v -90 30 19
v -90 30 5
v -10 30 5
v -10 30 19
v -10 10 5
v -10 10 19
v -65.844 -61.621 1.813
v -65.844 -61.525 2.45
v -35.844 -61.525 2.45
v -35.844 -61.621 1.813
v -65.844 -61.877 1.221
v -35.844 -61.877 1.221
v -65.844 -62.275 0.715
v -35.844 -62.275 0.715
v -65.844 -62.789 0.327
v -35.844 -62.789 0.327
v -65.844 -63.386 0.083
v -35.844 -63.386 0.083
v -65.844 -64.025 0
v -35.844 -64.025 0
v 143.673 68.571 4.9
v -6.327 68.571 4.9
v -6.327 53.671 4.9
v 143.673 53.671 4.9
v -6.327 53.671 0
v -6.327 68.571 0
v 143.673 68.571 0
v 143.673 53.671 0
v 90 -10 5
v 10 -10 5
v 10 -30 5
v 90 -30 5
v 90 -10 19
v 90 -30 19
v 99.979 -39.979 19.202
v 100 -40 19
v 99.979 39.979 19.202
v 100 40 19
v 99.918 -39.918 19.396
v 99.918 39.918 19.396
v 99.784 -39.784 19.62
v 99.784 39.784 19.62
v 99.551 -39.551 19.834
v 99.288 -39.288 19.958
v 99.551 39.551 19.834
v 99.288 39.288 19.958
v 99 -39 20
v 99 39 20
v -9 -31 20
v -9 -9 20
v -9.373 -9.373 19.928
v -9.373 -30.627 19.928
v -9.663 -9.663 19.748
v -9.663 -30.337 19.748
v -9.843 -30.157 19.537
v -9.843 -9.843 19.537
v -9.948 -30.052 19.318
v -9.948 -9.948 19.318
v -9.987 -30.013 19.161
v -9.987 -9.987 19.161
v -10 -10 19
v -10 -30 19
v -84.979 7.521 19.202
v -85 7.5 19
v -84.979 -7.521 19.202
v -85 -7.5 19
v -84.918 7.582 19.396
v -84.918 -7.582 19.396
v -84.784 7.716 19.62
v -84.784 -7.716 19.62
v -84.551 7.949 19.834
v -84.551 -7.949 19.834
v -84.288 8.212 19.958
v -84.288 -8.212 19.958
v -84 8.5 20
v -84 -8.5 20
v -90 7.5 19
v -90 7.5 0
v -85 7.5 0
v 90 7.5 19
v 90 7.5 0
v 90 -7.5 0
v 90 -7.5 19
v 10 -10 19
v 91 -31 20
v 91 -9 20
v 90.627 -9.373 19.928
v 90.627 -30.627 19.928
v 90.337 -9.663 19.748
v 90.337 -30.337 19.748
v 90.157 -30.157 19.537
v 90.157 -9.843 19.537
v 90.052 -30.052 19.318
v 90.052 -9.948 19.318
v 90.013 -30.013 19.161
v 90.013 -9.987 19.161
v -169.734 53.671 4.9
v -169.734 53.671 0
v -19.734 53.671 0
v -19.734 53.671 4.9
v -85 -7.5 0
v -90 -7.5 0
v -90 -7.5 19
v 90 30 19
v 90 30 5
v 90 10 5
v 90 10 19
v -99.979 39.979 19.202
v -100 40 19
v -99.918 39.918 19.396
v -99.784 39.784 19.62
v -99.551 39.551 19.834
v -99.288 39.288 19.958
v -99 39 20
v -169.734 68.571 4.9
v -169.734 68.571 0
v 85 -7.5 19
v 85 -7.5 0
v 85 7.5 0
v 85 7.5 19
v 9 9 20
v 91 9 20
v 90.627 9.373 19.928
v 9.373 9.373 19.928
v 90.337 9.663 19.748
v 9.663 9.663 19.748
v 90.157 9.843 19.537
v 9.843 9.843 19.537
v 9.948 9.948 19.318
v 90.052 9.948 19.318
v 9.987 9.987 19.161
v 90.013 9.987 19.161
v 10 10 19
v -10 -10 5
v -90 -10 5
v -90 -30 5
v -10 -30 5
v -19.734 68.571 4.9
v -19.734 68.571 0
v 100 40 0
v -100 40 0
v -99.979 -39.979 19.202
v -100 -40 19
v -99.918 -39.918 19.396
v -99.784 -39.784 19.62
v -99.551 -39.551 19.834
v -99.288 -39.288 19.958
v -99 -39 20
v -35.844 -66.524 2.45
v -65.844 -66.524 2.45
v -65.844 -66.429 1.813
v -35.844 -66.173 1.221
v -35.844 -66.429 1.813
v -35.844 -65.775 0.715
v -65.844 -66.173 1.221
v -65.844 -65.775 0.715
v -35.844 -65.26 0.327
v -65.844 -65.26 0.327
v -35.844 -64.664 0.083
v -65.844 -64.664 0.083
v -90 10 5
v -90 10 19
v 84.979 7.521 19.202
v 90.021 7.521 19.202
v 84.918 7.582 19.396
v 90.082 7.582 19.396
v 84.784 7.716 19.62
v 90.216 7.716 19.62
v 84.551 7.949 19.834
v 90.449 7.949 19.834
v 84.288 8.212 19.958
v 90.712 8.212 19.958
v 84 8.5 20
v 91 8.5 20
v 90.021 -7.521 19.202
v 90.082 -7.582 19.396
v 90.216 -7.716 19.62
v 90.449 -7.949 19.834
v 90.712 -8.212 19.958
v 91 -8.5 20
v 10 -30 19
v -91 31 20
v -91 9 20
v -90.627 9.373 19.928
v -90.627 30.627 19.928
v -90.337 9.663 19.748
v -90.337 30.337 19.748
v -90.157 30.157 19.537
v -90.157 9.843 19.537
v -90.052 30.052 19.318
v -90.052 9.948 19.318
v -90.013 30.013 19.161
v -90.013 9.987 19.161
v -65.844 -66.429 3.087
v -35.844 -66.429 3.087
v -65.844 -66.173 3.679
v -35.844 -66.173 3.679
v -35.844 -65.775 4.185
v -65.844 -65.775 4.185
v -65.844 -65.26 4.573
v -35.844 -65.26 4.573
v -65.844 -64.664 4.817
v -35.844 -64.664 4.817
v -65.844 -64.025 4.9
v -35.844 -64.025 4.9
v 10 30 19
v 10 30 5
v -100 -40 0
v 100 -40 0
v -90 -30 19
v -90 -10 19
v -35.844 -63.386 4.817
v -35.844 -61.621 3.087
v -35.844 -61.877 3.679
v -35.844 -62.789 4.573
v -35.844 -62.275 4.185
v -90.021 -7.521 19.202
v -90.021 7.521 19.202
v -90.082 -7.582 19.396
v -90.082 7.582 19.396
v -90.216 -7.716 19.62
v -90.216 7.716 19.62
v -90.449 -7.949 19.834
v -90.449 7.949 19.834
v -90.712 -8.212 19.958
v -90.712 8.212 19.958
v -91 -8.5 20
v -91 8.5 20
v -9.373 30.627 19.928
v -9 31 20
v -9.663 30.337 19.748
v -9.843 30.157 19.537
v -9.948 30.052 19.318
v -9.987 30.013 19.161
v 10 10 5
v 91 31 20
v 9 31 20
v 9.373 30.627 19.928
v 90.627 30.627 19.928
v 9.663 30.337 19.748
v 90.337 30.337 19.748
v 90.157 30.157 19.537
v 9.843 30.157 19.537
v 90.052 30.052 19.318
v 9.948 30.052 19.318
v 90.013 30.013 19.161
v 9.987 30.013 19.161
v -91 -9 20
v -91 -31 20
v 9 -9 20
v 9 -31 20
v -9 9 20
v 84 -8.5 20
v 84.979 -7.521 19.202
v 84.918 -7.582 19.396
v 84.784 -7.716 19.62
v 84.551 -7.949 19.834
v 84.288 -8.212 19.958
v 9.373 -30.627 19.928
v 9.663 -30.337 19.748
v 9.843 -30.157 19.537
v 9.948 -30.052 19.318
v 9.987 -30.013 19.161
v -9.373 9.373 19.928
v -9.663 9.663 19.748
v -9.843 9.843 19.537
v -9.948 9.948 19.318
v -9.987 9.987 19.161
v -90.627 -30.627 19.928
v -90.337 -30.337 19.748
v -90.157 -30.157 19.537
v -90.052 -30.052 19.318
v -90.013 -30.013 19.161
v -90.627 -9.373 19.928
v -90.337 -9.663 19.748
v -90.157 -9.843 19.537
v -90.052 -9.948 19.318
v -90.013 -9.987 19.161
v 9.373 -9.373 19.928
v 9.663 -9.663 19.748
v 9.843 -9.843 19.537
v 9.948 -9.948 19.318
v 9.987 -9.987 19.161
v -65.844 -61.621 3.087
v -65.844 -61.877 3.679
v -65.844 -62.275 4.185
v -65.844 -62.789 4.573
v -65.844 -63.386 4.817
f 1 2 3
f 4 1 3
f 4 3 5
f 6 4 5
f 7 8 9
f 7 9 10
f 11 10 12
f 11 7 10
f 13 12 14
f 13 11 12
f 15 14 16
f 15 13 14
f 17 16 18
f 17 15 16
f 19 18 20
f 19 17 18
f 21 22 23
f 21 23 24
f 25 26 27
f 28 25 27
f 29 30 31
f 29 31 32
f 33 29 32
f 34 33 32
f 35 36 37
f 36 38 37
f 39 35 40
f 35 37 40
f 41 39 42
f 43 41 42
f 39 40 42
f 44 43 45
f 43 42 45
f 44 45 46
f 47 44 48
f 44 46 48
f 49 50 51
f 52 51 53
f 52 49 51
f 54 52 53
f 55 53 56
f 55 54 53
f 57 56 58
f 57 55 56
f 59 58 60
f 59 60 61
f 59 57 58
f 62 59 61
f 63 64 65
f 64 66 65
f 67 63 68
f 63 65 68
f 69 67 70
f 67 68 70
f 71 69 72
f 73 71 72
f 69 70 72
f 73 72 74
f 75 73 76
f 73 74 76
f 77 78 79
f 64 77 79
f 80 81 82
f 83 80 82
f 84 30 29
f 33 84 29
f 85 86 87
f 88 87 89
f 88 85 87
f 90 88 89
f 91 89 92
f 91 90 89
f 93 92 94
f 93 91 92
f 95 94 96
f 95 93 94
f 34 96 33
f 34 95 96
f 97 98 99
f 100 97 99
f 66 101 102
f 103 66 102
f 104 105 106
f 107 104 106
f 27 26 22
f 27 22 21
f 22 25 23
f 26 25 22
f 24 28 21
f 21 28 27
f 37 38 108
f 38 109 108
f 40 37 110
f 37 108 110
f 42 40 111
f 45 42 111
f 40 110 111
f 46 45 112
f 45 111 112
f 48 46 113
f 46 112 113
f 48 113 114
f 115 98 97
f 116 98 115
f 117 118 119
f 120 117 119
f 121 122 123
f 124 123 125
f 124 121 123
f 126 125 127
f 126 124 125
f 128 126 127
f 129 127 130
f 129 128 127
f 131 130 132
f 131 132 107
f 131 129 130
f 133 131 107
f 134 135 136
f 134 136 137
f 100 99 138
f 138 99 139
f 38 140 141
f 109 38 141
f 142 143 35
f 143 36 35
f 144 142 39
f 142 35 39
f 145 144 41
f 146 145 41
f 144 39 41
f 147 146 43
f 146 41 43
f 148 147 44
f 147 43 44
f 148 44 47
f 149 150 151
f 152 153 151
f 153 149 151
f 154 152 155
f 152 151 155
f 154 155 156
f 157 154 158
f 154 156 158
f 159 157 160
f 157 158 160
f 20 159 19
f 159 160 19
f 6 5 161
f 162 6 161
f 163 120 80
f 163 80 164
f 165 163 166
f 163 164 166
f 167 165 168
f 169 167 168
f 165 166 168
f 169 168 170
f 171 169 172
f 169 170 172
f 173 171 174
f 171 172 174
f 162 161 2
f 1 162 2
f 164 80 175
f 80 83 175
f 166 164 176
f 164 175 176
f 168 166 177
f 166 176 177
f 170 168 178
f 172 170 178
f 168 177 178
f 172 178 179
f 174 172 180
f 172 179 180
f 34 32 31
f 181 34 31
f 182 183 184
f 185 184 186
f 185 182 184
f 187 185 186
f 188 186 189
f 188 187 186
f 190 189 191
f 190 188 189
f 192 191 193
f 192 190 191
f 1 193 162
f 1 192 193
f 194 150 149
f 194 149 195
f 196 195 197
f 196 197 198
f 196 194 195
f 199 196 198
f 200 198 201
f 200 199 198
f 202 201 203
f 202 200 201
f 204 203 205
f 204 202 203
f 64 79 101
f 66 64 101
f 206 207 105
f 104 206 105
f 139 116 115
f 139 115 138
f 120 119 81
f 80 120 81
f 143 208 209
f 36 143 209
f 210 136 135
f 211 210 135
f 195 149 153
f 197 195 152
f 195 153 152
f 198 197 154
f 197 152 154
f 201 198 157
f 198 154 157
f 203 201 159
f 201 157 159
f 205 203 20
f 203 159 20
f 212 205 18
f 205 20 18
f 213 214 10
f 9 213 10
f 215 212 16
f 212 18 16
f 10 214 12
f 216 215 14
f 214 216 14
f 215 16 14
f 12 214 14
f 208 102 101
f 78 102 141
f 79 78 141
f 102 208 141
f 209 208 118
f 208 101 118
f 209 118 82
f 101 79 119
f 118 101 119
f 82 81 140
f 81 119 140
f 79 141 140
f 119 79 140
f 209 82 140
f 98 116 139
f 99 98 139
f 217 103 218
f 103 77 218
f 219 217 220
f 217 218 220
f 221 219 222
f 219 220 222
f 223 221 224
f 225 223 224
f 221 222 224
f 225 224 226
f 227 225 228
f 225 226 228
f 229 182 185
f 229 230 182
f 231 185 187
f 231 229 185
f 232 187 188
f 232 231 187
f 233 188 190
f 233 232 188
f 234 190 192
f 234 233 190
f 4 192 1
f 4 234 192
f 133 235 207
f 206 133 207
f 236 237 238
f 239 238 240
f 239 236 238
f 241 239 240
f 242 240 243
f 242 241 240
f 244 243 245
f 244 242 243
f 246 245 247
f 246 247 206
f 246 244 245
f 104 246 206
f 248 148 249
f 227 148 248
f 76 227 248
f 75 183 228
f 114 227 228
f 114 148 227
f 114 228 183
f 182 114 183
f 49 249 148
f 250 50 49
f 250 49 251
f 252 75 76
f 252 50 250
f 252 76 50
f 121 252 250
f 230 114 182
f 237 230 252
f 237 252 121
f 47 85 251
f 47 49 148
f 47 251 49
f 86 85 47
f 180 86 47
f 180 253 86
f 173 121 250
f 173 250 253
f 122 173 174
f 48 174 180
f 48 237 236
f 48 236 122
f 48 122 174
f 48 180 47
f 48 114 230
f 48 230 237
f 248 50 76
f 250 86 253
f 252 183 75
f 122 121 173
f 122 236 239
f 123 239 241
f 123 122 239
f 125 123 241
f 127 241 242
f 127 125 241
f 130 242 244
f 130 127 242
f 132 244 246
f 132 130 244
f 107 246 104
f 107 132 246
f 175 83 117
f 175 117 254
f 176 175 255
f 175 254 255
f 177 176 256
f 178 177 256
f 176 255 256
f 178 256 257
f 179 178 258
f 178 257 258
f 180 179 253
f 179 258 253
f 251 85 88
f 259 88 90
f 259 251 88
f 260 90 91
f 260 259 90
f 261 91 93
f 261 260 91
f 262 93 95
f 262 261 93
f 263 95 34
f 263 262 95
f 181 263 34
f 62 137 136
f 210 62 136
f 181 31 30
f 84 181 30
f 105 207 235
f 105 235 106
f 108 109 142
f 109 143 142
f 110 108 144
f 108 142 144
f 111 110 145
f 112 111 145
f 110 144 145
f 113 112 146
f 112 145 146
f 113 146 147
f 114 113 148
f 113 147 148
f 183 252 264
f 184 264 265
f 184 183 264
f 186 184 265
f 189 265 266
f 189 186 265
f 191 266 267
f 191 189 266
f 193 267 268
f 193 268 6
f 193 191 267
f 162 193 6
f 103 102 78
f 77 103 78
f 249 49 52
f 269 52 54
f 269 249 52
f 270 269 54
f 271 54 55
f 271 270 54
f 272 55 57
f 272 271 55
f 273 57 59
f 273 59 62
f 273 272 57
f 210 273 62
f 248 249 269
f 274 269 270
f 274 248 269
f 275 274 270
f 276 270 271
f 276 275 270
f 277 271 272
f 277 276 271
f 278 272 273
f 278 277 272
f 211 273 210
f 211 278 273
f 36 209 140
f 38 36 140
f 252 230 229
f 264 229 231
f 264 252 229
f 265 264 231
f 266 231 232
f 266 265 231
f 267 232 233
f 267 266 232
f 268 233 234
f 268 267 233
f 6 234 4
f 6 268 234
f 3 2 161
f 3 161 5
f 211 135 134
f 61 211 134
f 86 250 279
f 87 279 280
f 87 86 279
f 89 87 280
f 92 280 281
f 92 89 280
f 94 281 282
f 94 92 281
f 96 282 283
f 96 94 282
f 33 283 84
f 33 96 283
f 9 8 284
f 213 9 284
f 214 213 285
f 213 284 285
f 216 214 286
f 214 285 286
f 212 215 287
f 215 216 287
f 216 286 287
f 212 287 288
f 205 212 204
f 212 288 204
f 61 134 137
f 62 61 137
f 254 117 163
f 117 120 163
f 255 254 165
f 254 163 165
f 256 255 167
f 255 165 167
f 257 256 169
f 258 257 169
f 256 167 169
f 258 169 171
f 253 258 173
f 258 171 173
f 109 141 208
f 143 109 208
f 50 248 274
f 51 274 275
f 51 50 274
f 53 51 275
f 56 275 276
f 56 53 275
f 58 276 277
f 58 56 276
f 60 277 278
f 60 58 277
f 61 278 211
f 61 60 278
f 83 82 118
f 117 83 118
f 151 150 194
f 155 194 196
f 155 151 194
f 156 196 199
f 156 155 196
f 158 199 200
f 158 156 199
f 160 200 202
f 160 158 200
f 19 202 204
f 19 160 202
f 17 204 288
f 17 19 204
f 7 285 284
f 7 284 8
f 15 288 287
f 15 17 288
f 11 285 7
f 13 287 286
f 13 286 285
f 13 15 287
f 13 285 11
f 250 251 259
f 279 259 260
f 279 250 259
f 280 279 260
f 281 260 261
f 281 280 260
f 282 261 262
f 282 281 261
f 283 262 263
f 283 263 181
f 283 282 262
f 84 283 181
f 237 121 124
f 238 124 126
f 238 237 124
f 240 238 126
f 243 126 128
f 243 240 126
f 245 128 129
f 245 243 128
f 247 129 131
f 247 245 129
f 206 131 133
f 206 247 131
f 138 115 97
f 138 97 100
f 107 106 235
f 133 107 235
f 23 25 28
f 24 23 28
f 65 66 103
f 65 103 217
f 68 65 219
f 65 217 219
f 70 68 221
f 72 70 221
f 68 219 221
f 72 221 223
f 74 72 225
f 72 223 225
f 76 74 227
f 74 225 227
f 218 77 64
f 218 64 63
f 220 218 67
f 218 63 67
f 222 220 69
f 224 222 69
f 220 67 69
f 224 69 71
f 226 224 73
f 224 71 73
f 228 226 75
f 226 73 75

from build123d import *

# Parameters (mm, degrees)
F0_W        = 10
F0_H        = 10
F1_DEPTH    = 20
F0_W_2      = 80
F0_H_2      = 20
F2_DEPTH    = 5
F3_DEPTH    = 5
F4_DEPTH    = 5
F5_DEPTH    = 5
F6_W        = 150
F6_H        = 14.9
F7_DEPTH    = 4.9
F6_W_2      = 30
F6_H_2      = 5
F8_R        = 1
F9_T1_DEPTH = 42.5


# Not quite as in the source:
# - a fillet or chamfer that OpenCascade refuses, or shapes differently, is made with other operations: its cross-section is extruded or revolved along the edge and cut away or added


with BuildPart() as f1:
    # F0 (on Top) → F1 (new body)
    with BuildSketch(Plane.XY):
        Polygon((10, 10), (10, 30), (-10, 30), (-10, 10), (-90, 10), (-90, 7.5), (-85, 7.5), (-85, -7.5), (-90, -7.5), (-90, -10), (-10, -10), (-10, -30), (10, -30), (10, -10), (90, -10), (90, -7.5), (85, -7.5), (85, 7.5), (90, 7.5), (90, 10), align=None)
        Polygon((-90, 10), (-90, 30), (-100, 30), (-100, -30), (-90, -30), (-90, -10), (-90, -7.5), (-90, 7.5), align=None)
        with Locations((-95, -35)):
            Rectangle(F0_W, F0_H)
        Polygon((90, -40), (90, -30), (10, -30), (-10, -30), (-90, -30), (-90, -40), align=None)
        with Locations((-95, 35)):
            Rectangle(F0_W, F0_H)
        Polygon((90, 30), (90, 40), (-90, 40), (-90, 30), (-10, 30), (10, 30), align=None)
        with Locations((95, 35)):
            Rectangle(F0_W, F0_H)
        Polygon((100, -30), (100, 30), (90, 30), (90, 10), (90, 7.5), (90, -7.5), (90, -10), (90, -30), align=None)
        with Locations((95, -35)):
            Rectangle(F0_W, F0_H)
    extrude(amount=F1_DEPTH)

    # F0 (on Top) → F2 (join)
    with BuildSketch(Plane.XY):
        with Locations((-50, 20)):
            Rectangle(F0_W_2, F0_H_2)
    extrude(amount=F2_DEPTH)

    # F0 (on Top) → F3 (join)
    with BuildSketch(Plane.XY):
        with Locations((-50, -20)):
            Rectangle(F0_W_2, F0_H_2)
    extrude(amount=F3_DEPTH)

    # F0 (on Top) → F4 (join)
    with BuildSketch(Plane.XY):
        with Locations((50, 20)):
            Rectangle(F0_W_2, F0_H_2)
    extrude(amount=F4_DEPTH)

    # F0 (on Top) → F5 (join)
    with BuildSketch(Plane.XY):
        with Locations((50, -20)):
            Rectangle(F0_W_2, F0_H_2)
    extrude(amount=F5_DEPTH)

    # F8
    f8_edges = [f1.edges().sort_by_distance(p)[0] for p in [
        (-90, 0, 20),
        (-85, 0, 20),
        (-87.5, 7.5, 20),
        (-87.5, -7.5, 20),
        (85, 0, 20),
        (87.5, 7.5, 20),
        (90, 0, 20),
        (87.5, -7.5, 20),
        (-50, -10, 20),
        (-90, -20, 20),
        (-50, -30, 20),
        (50, -30, 20),
        (-10, -20, 20),
        (50, -10, 20),
        (10, -20, 20),
        (90, -20, 20),
        (0, -40, 20),
        (100, 0, 20),
        (0, 40, 20),
        (-100, 0, 20),
        (-10, 20, 20),
        (-50, 10, 20),
        (-90, 20, 20),
        (-50, 30, 20),
        (10, 20, 20),
        (50, 30, 20),
        (90, 20, 20),
        (50, 10, 20),
    ]]
    fillet(f8_edges, radius=F8_R)


with BuildPart() as f7:
    # F6 (on Top) → F7 (new body)
    with BuildSketch(Plane.XY):
        with Locations((-94.7340503335, 61.1213589191)):
            Rectangle(F6_W, F6_H)
    extrude(amount=F7_DEPTH)


with BuildPart() as f7b:
    # F6 (on Top) → F7, piece 2 (new body)
    with BuildSketch(Plane.XY):
        with Locations((68.6728258617, 61.1213589191)):
            Rectangle(F6_W, F6_H)
    extrude(amount=F7_DEPTH)


with BuildPart() as f7c:
    # F6 (on Top) → F7, piece 3 (new body)
    with BuildSketch(Plane.XY):
        with Locations((-50.844014287, -64.0248632431)):
            Rectangle(F6_W_2, F6_H_2)
    extrude(amount=F7_DEPTH)

    # F9: fillet of radius 2.5 on 4 edges, made by hand

    # F9_s2 → F9_t1 (cut)
    with BuildSketch(Plane.YZ.offset(-72.094014287)):
        with BuildLine():
            ThreePointArc((-66.5248632431, 2.4), (-65.7926301961, 4.167766953), (-64.0248632431, 4.9))
            Line((-64.0248632431, 4.9), (-66.5248632431, 4.9))
            Line((-66.5248632431, 4.9), (-66.5248632431, 2.4))
        make_face()
        with BuildLine():
            ThreePointArc((-61.5248632431, 2.4), (-62.2570962901, 4.167766953), (-64.0248632431, 4.9))
            Line((-64.0248632431, 4.9), (-61.5248632431, 4.9))
            Line((-61.5248632431, 4.9), (-61.5248632431, 2.4))
        make_face()
        with BuildLine():
            ThreePointArc((-66.5248632431, 2.5), (-65.7926301961, 0.732233047), (-64.0248632431, 0))
            Line((-64.0248632431, 0), (-66.5248632431, 0))
            Line((-66.5248632431, 0), (-66.5248632431, 2.5))
        make_face()
        with BuildLine():
            ThreePointArc((-61.5248632431, 2.5), (-62.2570962901, 0.732233047), (-64.0248632431, 0))
            Line((-64.0248632431, 0), (-61.5248632431, 0))
            Line((-61.5248632431, 0), (-61.5248632431, 2.5))
        make_face()
    extrude(amount=F9_T1_DEPTH, mode=Mode.SUBTRACT)


solid = Compound([f1.part, f7.part, f7b.part, f7c.part])
